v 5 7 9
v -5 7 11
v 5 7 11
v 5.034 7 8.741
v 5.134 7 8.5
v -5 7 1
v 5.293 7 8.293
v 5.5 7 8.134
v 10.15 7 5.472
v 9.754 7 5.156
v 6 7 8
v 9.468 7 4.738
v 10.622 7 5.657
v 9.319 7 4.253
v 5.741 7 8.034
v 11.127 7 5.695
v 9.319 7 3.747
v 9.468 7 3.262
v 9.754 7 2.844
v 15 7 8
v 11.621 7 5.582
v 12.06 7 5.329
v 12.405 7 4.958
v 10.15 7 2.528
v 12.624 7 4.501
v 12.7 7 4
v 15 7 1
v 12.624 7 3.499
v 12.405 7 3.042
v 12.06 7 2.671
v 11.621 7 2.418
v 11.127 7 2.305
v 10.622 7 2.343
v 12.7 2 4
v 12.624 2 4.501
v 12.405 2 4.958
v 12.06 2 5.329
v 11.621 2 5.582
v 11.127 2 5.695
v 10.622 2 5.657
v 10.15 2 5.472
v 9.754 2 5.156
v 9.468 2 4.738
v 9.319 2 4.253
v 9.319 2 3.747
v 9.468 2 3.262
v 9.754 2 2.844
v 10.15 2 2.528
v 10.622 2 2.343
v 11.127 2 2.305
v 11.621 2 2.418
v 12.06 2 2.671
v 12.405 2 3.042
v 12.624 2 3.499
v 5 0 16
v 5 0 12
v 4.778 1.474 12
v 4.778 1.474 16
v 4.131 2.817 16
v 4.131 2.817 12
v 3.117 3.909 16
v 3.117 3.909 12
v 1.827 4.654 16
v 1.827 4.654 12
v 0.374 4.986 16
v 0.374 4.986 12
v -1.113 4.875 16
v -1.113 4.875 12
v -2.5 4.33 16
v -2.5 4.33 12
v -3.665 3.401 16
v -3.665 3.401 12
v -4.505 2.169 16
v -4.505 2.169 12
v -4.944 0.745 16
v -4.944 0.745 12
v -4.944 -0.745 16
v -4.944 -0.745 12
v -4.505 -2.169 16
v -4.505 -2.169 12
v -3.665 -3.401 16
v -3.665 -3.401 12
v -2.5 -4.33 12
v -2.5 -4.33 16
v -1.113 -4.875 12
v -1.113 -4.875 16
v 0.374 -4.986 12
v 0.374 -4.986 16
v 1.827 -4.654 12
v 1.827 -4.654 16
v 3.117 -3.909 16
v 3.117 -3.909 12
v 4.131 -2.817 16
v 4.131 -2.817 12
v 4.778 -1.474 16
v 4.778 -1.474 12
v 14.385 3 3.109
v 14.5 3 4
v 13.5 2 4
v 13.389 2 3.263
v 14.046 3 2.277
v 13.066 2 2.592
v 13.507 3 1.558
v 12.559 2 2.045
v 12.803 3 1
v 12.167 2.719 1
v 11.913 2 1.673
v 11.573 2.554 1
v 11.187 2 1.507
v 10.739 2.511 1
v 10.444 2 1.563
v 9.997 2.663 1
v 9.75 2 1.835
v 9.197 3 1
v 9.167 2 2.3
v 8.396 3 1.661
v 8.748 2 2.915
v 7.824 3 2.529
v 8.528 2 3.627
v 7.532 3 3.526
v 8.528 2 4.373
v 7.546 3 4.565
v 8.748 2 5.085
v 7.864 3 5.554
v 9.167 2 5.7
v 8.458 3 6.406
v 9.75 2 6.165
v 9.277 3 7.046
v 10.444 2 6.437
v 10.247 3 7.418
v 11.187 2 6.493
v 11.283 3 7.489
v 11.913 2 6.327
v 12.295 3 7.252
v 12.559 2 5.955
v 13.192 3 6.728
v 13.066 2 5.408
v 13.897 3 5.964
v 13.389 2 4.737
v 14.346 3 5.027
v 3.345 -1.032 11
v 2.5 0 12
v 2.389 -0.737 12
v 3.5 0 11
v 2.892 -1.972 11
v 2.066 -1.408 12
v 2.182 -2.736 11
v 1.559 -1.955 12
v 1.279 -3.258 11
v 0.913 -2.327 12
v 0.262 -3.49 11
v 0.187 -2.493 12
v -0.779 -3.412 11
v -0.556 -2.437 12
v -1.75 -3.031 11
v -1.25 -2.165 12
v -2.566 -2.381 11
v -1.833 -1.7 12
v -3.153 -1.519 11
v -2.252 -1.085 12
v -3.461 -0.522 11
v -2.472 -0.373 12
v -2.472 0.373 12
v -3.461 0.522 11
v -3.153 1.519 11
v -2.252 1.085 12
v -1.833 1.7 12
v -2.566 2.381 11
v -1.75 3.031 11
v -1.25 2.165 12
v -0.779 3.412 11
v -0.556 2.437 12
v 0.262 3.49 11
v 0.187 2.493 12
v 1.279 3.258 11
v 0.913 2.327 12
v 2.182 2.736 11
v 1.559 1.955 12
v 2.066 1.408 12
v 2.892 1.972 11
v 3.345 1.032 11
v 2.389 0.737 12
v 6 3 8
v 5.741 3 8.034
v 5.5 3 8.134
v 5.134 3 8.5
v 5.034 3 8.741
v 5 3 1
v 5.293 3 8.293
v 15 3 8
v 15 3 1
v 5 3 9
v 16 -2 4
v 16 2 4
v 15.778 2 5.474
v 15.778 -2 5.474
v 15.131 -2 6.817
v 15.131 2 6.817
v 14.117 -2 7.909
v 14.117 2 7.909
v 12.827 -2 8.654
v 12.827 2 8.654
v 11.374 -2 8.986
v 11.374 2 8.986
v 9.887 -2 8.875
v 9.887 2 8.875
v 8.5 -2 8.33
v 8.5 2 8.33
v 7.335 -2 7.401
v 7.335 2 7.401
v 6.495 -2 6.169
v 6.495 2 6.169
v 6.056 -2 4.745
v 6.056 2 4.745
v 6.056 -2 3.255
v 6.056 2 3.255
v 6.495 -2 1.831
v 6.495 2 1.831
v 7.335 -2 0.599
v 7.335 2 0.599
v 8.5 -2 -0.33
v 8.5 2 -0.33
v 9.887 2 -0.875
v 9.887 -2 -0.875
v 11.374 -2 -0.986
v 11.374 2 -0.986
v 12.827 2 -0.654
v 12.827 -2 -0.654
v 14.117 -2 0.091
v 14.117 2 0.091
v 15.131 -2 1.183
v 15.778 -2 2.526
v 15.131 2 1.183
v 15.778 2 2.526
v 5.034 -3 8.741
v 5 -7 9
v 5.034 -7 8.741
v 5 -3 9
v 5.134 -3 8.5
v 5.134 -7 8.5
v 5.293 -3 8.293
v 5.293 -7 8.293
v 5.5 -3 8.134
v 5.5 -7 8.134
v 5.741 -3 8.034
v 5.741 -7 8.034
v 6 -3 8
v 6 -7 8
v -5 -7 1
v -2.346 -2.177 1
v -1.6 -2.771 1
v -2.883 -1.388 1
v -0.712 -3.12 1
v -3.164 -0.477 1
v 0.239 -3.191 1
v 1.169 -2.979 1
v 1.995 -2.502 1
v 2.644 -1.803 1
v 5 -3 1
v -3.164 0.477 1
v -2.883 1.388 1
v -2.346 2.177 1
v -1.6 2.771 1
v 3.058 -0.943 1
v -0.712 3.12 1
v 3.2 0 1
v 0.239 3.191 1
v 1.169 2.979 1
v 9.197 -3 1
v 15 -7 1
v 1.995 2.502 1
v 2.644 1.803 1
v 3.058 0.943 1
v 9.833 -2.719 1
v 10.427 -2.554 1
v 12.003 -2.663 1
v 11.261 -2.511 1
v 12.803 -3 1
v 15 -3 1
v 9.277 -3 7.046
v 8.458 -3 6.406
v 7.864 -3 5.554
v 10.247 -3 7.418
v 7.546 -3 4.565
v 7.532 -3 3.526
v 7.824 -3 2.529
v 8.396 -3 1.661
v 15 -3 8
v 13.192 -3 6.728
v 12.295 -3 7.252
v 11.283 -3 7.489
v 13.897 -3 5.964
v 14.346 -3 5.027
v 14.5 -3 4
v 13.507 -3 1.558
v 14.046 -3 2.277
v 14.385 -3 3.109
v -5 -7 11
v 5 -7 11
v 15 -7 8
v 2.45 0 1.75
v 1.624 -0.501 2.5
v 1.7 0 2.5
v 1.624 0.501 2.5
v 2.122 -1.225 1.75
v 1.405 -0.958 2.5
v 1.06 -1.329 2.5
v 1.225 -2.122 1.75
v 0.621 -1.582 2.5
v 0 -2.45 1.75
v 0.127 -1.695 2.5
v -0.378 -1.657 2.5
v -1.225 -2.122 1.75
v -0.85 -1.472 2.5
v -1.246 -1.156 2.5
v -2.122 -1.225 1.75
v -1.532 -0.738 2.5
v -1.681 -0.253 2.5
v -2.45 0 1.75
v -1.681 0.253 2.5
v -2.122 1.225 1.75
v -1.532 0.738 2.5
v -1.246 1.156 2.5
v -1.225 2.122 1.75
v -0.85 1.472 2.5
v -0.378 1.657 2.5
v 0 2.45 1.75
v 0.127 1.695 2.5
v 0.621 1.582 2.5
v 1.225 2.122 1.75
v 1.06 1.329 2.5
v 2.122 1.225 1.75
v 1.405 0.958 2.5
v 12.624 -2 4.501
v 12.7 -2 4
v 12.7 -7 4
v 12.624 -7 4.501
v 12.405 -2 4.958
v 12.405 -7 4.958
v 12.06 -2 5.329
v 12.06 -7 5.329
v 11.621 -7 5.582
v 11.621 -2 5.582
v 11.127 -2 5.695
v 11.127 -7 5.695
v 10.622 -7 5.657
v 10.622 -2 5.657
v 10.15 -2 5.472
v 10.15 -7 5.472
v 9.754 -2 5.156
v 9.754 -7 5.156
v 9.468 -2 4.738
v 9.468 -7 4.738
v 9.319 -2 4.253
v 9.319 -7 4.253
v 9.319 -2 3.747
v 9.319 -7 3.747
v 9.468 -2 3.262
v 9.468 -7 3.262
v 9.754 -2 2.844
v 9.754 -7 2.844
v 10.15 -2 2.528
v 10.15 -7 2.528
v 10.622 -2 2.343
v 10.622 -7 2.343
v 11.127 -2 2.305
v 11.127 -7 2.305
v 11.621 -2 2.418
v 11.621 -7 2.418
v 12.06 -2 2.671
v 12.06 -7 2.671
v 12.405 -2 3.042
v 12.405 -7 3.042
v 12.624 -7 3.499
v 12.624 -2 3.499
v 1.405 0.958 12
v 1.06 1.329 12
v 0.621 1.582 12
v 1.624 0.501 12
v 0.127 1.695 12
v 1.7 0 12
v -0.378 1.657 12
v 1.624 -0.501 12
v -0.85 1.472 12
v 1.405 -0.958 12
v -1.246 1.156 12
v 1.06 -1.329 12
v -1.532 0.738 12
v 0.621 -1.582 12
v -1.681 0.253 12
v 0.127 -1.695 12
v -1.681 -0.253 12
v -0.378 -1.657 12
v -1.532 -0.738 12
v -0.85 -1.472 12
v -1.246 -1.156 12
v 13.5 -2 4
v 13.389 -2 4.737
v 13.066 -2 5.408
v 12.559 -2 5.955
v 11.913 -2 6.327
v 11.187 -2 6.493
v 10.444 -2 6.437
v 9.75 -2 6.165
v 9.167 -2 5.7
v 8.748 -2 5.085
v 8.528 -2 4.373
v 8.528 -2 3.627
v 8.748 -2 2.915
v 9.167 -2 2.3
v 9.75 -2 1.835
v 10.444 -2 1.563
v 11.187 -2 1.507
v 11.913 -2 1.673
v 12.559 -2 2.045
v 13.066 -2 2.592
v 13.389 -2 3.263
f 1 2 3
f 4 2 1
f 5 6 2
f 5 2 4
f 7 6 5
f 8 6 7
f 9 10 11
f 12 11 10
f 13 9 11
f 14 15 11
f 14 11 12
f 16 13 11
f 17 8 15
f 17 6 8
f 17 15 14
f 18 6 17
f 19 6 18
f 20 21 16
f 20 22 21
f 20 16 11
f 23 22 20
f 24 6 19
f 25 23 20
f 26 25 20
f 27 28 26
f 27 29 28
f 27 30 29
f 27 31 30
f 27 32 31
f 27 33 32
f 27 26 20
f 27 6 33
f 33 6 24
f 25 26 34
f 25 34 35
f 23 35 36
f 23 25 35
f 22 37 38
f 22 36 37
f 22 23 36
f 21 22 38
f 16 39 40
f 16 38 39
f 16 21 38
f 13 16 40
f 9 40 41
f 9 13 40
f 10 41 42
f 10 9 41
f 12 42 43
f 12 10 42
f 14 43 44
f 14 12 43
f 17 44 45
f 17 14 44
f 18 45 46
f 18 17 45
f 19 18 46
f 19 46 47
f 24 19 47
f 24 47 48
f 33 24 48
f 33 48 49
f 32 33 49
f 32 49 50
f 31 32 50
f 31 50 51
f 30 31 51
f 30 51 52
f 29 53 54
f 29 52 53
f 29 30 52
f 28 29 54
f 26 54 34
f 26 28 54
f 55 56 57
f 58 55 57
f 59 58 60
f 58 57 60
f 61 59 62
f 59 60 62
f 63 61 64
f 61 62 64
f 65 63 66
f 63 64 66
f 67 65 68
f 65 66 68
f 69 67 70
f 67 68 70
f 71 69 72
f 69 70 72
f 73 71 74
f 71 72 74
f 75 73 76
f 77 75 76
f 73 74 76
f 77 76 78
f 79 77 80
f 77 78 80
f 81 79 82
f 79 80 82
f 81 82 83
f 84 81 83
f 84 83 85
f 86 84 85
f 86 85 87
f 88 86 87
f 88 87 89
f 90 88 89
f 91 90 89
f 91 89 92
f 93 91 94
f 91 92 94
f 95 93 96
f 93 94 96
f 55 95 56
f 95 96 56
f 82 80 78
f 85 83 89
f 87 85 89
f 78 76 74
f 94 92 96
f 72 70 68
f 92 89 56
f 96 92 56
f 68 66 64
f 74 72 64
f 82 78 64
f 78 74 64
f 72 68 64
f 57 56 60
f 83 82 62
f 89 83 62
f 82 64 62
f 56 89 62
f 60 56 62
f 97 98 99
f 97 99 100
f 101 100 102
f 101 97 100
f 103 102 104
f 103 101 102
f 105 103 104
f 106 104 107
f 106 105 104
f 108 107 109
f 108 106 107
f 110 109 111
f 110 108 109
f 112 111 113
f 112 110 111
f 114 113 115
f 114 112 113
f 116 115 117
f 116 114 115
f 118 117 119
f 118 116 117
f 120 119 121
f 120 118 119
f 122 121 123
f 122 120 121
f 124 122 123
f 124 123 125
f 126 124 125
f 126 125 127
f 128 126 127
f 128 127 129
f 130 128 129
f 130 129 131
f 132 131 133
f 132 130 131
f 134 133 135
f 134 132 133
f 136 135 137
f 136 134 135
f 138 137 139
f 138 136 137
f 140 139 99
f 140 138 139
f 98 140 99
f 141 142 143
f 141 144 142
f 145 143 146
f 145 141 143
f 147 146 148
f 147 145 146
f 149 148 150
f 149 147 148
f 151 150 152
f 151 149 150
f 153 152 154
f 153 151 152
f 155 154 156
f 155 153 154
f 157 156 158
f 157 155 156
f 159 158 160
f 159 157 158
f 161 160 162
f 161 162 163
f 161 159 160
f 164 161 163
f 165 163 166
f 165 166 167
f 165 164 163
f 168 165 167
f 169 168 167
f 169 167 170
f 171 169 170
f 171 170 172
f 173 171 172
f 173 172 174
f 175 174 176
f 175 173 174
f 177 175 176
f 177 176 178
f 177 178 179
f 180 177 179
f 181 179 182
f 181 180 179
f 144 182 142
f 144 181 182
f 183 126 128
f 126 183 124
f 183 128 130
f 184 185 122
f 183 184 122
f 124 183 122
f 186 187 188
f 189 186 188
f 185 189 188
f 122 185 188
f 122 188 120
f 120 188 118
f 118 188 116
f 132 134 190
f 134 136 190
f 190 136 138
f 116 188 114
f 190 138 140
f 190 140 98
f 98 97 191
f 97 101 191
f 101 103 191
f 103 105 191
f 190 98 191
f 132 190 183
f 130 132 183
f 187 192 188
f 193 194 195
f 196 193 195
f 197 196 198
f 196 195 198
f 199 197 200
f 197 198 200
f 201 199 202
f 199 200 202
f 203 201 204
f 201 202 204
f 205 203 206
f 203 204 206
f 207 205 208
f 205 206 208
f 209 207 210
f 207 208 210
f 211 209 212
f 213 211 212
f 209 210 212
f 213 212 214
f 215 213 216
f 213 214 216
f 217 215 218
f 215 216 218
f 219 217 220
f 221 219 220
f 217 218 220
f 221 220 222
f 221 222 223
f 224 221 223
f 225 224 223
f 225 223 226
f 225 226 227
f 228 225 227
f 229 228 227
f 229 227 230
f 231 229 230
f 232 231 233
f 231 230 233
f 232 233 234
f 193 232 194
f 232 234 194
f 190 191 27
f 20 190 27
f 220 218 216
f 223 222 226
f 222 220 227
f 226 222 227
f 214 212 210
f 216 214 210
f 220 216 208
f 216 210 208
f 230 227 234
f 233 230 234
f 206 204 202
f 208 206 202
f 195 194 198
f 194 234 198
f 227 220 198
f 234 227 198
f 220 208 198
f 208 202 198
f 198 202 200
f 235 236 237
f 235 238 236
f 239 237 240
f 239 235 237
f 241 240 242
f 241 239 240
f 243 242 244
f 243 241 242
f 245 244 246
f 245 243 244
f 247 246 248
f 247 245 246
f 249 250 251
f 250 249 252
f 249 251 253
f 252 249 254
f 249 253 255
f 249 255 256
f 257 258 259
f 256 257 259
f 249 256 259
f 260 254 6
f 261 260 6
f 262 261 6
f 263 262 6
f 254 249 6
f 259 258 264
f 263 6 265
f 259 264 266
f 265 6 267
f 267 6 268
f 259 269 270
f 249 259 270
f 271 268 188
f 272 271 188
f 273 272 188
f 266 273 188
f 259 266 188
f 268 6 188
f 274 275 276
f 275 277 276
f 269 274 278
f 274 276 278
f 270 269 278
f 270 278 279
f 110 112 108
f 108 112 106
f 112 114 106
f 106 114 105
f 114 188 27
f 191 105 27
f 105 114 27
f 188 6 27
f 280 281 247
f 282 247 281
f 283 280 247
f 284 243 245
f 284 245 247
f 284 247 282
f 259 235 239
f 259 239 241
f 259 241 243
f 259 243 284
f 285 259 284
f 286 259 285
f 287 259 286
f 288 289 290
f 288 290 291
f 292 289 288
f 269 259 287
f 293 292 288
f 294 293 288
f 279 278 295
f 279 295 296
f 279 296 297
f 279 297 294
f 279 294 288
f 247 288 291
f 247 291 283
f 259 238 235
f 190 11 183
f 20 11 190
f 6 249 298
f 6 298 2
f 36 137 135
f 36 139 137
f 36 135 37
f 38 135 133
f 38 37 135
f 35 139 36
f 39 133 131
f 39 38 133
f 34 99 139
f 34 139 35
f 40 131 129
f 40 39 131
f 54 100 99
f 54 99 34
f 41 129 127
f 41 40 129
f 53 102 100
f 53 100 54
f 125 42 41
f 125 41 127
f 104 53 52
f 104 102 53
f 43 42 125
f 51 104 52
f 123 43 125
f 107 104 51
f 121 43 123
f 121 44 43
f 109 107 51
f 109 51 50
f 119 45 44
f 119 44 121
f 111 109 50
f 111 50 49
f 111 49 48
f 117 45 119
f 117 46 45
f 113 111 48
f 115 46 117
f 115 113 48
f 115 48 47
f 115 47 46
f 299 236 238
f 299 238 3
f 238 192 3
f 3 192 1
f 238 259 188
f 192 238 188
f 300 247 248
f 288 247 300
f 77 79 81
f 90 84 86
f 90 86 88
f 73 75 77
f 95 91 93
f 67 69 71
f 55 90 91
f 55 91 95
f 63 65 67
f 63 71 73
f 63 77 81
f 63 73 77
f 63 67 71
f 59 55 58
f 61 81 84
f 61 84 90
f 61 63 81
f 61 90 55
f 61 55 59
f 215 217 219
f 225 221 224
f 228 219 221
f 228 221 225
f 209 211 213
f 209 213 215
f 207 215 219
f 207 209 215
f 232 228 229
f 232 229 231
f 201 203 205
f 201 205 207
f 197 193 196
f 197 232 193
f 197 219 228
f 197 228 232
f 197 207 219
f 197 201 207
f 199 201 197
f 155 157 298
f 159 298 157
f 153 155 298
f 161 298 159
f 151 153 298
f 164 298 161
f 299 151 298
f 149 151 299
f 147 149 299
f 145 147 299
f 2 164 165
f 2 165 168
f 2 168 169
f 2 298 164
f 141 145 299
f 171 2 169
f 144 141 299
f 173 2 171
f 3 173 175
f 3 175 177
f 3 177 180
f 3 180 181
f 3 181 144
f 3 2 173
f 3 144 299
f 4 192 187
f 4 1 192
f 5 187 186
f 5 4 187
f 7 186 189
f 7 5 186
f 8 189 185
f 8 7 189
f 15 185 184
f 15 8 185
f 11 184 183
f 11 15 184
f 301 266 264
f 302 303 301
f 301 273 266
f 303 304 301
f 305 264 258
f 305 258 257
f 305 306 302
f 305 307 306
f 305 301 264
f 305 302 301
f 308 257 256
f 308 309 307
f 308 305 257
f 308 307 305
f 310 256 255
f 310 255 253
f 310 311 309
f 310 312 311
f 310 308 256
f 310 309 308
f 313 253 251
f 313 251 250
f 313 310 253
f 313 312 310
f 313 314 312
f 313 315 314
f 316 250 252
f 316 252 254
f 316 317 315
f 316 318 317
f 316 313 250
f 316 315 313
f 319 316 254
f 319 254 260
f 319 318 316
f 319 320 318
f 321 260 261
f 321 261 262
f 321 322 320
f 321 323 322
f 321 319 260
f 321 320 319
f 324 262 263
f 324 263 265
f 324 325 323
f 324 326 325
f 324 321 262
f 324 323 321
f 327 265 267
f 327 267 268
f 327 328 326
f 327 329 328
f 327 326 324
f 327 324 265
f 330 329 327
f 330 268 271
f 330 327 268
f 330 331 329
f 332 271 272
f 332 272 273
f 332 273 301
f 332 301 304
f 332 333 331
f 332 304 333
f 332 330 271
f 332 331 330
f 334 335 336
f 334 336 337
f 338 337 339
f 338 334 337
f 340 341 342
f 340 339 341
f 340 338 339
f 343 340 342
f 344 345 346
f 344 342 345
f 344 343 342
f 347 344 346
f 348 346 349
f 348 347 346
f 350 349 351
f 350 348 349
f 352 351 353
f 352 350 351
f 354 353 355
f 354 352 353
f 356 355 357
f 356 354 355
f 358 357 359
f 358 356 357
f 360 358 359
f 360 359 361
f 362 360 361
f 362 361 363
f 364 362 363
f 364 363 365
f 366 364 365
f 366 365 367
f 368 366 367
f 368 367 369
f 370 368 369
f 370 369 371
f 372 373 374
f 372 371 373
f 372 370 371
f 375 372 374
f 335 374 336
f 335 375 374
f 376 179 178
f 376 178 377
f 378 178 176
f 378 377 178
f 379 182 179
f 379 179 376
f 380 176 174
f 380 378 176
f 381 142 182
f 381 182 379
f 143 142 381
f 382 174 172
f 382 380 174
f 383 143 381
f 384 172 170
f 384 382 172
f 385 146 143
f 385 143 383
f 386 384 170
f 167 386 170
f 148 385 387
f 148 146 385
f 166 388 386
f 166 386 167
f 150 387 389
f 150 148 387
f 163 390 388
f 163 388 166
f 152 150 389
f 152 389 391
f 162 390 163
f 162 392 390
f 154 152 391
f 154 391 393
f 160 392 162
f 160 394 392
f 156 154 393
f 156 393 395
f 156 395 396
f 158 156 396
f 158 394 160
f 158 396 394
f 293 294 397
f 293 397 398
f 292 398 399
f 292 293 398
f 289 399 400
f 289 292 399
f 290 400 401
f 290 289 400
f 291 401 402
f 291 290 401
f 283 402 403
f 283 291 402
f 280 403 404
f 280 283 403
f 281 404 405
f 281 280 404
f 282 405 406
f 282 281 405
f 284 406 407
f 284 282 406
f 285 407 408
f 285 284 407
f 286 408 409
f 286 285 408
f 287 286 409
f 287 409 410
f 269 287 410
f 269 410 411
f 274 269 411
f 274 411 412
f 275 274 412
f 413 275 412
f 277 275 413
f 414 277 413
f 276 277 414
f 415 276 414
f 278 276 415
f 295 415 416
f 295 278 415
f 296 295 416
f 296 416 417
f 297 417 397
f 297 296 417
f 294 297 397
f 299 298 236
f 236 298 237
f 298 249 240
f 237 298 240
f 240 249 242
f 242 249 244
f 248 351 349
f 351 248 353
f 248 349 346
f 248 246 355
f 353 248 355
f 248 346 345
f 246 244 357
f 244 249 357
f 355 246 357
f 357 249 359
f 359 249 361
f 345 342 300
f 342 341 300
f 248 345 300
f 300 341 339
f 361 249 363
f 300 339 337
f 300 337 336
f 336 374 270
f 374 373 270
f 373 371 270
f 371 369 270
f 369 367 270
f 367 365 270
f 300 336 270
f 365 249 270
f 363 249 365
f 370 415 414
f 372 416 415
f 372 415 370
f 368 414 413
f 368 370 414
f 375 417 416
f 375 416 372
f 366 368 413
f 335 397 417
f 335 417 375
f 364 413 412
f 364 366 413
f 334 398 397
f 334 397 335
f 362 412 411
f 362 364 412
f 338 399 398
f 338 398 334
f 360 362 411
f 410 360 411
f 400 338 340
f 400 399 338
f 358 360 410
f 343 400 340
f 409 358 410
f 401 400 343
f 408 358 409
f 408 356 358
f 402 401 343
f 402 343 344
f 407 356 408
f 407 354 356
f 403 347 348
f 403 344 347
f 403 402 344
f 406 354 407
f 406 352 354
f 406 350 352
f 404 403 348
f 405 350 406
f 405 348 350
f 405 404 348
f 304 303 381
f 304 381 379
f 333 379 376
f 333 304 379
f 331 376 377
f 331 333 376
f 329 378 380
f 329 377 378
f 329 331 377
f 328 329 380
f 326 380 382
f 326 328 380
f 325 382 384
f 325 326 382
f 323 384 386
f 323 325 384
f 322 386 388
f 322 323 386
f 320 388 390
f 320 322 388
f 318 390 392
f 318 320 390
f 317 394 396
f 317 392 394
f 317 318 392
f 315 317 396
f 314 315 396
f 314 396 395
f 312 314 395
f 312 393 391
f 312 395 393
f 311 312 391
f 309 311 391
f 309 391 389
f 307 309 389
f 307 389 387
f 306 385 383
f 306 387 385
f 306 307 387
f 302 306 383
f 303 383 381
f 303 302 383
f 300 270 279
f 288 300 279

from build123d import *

# Parameters (mm, degrees)
CYLINDER082_R     = 5
CYLINDER082_DEPTH = 4
CYLINDER083_R     = 5
CYLINDER083_DEPTH = 4
CYLINDER084_R     = 1.7
CYLINDER084_DEPTH = 18
BOX002_W          = 11
BOX002_H          = 6
BOX002_DEPTH      = 10
BOX001_W          = 10
BOX001_H          = 14
BOX001_DEPTH      = 7
BOX003_W          = 10
BOX003_H          = 10
BOX003_DEPTH      = 10
CYLINDER_R        = 1.7
CYLINDER_DEPTH    = 14
BOX_W             = 10
BOX_H             = 14
BOX_DEPTH         = 10
CHAMFER_SIZE      = 1.5
FILLET_R          = 1


with BuildPart() as f_623_bearing:
    # Cylinder082 → Cylinder082 (new body)
    with BuildSketch(Plane.XY.offset(12)):
        Circle(CYLINDER082_R)
    extrude(amount=CYLINDER082_DEPTH)


with BuildPart() as f_623_bearing001:
    # Cylinder083 → Cylinder083 (new body)
    with BuildSketch(Plane(origin=(11, 2, 4), x_dir=(1, 0, 0), z_dir=(0, -1, 0))):
        Circle(CYLINDER083_R)
    extrude(amount=CYLINDER083_DEPTH)


with BuildPart() as screw:
    # Cylinder084 → Cylinder084 (new body)
    with BuildSketch(Plane(origin=(11, 8, 4), x_dir=(1, 0, 0), z_dir=(0, -1, 0))):
        Circle(CYLINDER084_R)
    extrude(amount=CYLINDER084_DEPTH)


with BuildPart() as cube002:
    # Box002 → Box002 (new body)
    with BuildSketch(Plane(origin=(5, -3, 0), x_dir=(1, 0, 0), z_dir=(0, 0, 1))):
        with Locations((5.5, 3)):
            Rectangle(BOX002_W, BOX002_H)
    extrude(amount=BOX002_DEPTH)


with BuildPart() as cut:
    # Box001 → Box001 (new body)
    with BuildSketch(Plane(origin=(5, -7, 1), x_dir=(1, 0, 0), z_dir=(0, 0, 1))):
        with Locations((5, 7)):
            Rectangle(BOX001_W, BOX001_H)
    extrude(amount=BOX001_DEPTH)

    # Cut: cut Cube002
    add(cube002.part, mode=Mode.SUBTRACT)


with BuildPart() as cube003:
    # Box003 → Box003 (new body)
    with BuildSketch(Plane(origin=(5, -5, -9), x_dir=(1, 0, 0), z_dir=(0, 0, 1))):
        with Locations((5, 5)):
            Rectangle(BOX003_W, BOX003_H)
    extrude(amount=BOX003_DEPTH)


with BuildPart() as cone002:
    # Cone002 → Cone002 (revolve)
    with BuildSketch(Plane(origin=(11, 2, 4), x_dir=(1, 0, 0), z_dir=(0, 0, 1))):
        Polygon((0, 0), (2.5, 0), (3.5, 1), (0, 1), align=None)
    revolve(axis=Axis((11, 2, 4), (0, 1, 0)))


with BuildPart() as cut002:
    # Cone001 → Cone001 (revolve)
    with BuildSketch(Plane(origin=(11, -2, 4), x_dir=(1, 0, 0), z_dir=(0, 0, -1))):
        Polygon((0, 0), (2.5, 0), (3.5, 1), (0, 1), align=None)
    revolve(axis=Axis((11, -2, 4), (0, -1, 0)))

    # Fusion: union Cone002
    add(cone002.part)

    # Cut001: cut Cube003
    add(cube003.part, mode=Mode.SUBTRACT)

    # Fusion001: union Cut
    add(cut.part)

    # Cut002: cut screw
    add(screw.part, mode=Mode.SUBTRACT)


with BuildPart() as cylinder:
    # Cylinder → Cylinder (new body)
    with BuildSketch(Plane.XY):
        Circle(CYLINDER_R)
    extrude(amount=CYLINDER_DEPTH)


with BuildPart() as cone:
    # Cone → Cone (revolve)
    with BuildSketch(Plane(origin=(0, 0, 12), x_dir=(1, 0, 0), z_dir=(0, 1, 0))):
        Polygon((0, 0), (2.5, 0), (3.5, 1), (0, 1), align=None)
    revolve(axis=Axis((0, 0, 12), (0, 0, -1)))


with BuildPart() as fillet_body:
    # Box → Box (new body)
    with BuildSketch(Plane(origin=(-5, -7, 1), x_dir=(1, 0, 0), z_dir=(0, 0, 1))):
        with Locations((5, 7)):
            Rectangle(BOX_W, BOX_H)
    extrude(amount=BOX_DEPTH)

    # Fusion002: union Cone
    add(cone.part)

    # Cut003: cut Cylinder
    add(cylinder.part, mode=Mode.SUBTRACT)

    # Fusion003: union Cut002
    add(cut002.part)

    # Chamfer
    chamfer_edges = [fillet_body.edges().sort_by_distance(p)[0] for p in [
        (-1.7, 0, 1),
    ]]
    chamfer(chamfer_edges, length=CHAMFER_SIZE)

    # Fillet
    fillet_edges = [fillet_body.edges().sort_by_distance(p)[0] for p in [
        (5, 5, 8),
        (5, -5, 8),
    ]]
    fillet(fillet_edges, radius=FILLET_R)


solid = Compound([f_623_bearing.part, f_623_bearing001.part, fillet_body.part])
